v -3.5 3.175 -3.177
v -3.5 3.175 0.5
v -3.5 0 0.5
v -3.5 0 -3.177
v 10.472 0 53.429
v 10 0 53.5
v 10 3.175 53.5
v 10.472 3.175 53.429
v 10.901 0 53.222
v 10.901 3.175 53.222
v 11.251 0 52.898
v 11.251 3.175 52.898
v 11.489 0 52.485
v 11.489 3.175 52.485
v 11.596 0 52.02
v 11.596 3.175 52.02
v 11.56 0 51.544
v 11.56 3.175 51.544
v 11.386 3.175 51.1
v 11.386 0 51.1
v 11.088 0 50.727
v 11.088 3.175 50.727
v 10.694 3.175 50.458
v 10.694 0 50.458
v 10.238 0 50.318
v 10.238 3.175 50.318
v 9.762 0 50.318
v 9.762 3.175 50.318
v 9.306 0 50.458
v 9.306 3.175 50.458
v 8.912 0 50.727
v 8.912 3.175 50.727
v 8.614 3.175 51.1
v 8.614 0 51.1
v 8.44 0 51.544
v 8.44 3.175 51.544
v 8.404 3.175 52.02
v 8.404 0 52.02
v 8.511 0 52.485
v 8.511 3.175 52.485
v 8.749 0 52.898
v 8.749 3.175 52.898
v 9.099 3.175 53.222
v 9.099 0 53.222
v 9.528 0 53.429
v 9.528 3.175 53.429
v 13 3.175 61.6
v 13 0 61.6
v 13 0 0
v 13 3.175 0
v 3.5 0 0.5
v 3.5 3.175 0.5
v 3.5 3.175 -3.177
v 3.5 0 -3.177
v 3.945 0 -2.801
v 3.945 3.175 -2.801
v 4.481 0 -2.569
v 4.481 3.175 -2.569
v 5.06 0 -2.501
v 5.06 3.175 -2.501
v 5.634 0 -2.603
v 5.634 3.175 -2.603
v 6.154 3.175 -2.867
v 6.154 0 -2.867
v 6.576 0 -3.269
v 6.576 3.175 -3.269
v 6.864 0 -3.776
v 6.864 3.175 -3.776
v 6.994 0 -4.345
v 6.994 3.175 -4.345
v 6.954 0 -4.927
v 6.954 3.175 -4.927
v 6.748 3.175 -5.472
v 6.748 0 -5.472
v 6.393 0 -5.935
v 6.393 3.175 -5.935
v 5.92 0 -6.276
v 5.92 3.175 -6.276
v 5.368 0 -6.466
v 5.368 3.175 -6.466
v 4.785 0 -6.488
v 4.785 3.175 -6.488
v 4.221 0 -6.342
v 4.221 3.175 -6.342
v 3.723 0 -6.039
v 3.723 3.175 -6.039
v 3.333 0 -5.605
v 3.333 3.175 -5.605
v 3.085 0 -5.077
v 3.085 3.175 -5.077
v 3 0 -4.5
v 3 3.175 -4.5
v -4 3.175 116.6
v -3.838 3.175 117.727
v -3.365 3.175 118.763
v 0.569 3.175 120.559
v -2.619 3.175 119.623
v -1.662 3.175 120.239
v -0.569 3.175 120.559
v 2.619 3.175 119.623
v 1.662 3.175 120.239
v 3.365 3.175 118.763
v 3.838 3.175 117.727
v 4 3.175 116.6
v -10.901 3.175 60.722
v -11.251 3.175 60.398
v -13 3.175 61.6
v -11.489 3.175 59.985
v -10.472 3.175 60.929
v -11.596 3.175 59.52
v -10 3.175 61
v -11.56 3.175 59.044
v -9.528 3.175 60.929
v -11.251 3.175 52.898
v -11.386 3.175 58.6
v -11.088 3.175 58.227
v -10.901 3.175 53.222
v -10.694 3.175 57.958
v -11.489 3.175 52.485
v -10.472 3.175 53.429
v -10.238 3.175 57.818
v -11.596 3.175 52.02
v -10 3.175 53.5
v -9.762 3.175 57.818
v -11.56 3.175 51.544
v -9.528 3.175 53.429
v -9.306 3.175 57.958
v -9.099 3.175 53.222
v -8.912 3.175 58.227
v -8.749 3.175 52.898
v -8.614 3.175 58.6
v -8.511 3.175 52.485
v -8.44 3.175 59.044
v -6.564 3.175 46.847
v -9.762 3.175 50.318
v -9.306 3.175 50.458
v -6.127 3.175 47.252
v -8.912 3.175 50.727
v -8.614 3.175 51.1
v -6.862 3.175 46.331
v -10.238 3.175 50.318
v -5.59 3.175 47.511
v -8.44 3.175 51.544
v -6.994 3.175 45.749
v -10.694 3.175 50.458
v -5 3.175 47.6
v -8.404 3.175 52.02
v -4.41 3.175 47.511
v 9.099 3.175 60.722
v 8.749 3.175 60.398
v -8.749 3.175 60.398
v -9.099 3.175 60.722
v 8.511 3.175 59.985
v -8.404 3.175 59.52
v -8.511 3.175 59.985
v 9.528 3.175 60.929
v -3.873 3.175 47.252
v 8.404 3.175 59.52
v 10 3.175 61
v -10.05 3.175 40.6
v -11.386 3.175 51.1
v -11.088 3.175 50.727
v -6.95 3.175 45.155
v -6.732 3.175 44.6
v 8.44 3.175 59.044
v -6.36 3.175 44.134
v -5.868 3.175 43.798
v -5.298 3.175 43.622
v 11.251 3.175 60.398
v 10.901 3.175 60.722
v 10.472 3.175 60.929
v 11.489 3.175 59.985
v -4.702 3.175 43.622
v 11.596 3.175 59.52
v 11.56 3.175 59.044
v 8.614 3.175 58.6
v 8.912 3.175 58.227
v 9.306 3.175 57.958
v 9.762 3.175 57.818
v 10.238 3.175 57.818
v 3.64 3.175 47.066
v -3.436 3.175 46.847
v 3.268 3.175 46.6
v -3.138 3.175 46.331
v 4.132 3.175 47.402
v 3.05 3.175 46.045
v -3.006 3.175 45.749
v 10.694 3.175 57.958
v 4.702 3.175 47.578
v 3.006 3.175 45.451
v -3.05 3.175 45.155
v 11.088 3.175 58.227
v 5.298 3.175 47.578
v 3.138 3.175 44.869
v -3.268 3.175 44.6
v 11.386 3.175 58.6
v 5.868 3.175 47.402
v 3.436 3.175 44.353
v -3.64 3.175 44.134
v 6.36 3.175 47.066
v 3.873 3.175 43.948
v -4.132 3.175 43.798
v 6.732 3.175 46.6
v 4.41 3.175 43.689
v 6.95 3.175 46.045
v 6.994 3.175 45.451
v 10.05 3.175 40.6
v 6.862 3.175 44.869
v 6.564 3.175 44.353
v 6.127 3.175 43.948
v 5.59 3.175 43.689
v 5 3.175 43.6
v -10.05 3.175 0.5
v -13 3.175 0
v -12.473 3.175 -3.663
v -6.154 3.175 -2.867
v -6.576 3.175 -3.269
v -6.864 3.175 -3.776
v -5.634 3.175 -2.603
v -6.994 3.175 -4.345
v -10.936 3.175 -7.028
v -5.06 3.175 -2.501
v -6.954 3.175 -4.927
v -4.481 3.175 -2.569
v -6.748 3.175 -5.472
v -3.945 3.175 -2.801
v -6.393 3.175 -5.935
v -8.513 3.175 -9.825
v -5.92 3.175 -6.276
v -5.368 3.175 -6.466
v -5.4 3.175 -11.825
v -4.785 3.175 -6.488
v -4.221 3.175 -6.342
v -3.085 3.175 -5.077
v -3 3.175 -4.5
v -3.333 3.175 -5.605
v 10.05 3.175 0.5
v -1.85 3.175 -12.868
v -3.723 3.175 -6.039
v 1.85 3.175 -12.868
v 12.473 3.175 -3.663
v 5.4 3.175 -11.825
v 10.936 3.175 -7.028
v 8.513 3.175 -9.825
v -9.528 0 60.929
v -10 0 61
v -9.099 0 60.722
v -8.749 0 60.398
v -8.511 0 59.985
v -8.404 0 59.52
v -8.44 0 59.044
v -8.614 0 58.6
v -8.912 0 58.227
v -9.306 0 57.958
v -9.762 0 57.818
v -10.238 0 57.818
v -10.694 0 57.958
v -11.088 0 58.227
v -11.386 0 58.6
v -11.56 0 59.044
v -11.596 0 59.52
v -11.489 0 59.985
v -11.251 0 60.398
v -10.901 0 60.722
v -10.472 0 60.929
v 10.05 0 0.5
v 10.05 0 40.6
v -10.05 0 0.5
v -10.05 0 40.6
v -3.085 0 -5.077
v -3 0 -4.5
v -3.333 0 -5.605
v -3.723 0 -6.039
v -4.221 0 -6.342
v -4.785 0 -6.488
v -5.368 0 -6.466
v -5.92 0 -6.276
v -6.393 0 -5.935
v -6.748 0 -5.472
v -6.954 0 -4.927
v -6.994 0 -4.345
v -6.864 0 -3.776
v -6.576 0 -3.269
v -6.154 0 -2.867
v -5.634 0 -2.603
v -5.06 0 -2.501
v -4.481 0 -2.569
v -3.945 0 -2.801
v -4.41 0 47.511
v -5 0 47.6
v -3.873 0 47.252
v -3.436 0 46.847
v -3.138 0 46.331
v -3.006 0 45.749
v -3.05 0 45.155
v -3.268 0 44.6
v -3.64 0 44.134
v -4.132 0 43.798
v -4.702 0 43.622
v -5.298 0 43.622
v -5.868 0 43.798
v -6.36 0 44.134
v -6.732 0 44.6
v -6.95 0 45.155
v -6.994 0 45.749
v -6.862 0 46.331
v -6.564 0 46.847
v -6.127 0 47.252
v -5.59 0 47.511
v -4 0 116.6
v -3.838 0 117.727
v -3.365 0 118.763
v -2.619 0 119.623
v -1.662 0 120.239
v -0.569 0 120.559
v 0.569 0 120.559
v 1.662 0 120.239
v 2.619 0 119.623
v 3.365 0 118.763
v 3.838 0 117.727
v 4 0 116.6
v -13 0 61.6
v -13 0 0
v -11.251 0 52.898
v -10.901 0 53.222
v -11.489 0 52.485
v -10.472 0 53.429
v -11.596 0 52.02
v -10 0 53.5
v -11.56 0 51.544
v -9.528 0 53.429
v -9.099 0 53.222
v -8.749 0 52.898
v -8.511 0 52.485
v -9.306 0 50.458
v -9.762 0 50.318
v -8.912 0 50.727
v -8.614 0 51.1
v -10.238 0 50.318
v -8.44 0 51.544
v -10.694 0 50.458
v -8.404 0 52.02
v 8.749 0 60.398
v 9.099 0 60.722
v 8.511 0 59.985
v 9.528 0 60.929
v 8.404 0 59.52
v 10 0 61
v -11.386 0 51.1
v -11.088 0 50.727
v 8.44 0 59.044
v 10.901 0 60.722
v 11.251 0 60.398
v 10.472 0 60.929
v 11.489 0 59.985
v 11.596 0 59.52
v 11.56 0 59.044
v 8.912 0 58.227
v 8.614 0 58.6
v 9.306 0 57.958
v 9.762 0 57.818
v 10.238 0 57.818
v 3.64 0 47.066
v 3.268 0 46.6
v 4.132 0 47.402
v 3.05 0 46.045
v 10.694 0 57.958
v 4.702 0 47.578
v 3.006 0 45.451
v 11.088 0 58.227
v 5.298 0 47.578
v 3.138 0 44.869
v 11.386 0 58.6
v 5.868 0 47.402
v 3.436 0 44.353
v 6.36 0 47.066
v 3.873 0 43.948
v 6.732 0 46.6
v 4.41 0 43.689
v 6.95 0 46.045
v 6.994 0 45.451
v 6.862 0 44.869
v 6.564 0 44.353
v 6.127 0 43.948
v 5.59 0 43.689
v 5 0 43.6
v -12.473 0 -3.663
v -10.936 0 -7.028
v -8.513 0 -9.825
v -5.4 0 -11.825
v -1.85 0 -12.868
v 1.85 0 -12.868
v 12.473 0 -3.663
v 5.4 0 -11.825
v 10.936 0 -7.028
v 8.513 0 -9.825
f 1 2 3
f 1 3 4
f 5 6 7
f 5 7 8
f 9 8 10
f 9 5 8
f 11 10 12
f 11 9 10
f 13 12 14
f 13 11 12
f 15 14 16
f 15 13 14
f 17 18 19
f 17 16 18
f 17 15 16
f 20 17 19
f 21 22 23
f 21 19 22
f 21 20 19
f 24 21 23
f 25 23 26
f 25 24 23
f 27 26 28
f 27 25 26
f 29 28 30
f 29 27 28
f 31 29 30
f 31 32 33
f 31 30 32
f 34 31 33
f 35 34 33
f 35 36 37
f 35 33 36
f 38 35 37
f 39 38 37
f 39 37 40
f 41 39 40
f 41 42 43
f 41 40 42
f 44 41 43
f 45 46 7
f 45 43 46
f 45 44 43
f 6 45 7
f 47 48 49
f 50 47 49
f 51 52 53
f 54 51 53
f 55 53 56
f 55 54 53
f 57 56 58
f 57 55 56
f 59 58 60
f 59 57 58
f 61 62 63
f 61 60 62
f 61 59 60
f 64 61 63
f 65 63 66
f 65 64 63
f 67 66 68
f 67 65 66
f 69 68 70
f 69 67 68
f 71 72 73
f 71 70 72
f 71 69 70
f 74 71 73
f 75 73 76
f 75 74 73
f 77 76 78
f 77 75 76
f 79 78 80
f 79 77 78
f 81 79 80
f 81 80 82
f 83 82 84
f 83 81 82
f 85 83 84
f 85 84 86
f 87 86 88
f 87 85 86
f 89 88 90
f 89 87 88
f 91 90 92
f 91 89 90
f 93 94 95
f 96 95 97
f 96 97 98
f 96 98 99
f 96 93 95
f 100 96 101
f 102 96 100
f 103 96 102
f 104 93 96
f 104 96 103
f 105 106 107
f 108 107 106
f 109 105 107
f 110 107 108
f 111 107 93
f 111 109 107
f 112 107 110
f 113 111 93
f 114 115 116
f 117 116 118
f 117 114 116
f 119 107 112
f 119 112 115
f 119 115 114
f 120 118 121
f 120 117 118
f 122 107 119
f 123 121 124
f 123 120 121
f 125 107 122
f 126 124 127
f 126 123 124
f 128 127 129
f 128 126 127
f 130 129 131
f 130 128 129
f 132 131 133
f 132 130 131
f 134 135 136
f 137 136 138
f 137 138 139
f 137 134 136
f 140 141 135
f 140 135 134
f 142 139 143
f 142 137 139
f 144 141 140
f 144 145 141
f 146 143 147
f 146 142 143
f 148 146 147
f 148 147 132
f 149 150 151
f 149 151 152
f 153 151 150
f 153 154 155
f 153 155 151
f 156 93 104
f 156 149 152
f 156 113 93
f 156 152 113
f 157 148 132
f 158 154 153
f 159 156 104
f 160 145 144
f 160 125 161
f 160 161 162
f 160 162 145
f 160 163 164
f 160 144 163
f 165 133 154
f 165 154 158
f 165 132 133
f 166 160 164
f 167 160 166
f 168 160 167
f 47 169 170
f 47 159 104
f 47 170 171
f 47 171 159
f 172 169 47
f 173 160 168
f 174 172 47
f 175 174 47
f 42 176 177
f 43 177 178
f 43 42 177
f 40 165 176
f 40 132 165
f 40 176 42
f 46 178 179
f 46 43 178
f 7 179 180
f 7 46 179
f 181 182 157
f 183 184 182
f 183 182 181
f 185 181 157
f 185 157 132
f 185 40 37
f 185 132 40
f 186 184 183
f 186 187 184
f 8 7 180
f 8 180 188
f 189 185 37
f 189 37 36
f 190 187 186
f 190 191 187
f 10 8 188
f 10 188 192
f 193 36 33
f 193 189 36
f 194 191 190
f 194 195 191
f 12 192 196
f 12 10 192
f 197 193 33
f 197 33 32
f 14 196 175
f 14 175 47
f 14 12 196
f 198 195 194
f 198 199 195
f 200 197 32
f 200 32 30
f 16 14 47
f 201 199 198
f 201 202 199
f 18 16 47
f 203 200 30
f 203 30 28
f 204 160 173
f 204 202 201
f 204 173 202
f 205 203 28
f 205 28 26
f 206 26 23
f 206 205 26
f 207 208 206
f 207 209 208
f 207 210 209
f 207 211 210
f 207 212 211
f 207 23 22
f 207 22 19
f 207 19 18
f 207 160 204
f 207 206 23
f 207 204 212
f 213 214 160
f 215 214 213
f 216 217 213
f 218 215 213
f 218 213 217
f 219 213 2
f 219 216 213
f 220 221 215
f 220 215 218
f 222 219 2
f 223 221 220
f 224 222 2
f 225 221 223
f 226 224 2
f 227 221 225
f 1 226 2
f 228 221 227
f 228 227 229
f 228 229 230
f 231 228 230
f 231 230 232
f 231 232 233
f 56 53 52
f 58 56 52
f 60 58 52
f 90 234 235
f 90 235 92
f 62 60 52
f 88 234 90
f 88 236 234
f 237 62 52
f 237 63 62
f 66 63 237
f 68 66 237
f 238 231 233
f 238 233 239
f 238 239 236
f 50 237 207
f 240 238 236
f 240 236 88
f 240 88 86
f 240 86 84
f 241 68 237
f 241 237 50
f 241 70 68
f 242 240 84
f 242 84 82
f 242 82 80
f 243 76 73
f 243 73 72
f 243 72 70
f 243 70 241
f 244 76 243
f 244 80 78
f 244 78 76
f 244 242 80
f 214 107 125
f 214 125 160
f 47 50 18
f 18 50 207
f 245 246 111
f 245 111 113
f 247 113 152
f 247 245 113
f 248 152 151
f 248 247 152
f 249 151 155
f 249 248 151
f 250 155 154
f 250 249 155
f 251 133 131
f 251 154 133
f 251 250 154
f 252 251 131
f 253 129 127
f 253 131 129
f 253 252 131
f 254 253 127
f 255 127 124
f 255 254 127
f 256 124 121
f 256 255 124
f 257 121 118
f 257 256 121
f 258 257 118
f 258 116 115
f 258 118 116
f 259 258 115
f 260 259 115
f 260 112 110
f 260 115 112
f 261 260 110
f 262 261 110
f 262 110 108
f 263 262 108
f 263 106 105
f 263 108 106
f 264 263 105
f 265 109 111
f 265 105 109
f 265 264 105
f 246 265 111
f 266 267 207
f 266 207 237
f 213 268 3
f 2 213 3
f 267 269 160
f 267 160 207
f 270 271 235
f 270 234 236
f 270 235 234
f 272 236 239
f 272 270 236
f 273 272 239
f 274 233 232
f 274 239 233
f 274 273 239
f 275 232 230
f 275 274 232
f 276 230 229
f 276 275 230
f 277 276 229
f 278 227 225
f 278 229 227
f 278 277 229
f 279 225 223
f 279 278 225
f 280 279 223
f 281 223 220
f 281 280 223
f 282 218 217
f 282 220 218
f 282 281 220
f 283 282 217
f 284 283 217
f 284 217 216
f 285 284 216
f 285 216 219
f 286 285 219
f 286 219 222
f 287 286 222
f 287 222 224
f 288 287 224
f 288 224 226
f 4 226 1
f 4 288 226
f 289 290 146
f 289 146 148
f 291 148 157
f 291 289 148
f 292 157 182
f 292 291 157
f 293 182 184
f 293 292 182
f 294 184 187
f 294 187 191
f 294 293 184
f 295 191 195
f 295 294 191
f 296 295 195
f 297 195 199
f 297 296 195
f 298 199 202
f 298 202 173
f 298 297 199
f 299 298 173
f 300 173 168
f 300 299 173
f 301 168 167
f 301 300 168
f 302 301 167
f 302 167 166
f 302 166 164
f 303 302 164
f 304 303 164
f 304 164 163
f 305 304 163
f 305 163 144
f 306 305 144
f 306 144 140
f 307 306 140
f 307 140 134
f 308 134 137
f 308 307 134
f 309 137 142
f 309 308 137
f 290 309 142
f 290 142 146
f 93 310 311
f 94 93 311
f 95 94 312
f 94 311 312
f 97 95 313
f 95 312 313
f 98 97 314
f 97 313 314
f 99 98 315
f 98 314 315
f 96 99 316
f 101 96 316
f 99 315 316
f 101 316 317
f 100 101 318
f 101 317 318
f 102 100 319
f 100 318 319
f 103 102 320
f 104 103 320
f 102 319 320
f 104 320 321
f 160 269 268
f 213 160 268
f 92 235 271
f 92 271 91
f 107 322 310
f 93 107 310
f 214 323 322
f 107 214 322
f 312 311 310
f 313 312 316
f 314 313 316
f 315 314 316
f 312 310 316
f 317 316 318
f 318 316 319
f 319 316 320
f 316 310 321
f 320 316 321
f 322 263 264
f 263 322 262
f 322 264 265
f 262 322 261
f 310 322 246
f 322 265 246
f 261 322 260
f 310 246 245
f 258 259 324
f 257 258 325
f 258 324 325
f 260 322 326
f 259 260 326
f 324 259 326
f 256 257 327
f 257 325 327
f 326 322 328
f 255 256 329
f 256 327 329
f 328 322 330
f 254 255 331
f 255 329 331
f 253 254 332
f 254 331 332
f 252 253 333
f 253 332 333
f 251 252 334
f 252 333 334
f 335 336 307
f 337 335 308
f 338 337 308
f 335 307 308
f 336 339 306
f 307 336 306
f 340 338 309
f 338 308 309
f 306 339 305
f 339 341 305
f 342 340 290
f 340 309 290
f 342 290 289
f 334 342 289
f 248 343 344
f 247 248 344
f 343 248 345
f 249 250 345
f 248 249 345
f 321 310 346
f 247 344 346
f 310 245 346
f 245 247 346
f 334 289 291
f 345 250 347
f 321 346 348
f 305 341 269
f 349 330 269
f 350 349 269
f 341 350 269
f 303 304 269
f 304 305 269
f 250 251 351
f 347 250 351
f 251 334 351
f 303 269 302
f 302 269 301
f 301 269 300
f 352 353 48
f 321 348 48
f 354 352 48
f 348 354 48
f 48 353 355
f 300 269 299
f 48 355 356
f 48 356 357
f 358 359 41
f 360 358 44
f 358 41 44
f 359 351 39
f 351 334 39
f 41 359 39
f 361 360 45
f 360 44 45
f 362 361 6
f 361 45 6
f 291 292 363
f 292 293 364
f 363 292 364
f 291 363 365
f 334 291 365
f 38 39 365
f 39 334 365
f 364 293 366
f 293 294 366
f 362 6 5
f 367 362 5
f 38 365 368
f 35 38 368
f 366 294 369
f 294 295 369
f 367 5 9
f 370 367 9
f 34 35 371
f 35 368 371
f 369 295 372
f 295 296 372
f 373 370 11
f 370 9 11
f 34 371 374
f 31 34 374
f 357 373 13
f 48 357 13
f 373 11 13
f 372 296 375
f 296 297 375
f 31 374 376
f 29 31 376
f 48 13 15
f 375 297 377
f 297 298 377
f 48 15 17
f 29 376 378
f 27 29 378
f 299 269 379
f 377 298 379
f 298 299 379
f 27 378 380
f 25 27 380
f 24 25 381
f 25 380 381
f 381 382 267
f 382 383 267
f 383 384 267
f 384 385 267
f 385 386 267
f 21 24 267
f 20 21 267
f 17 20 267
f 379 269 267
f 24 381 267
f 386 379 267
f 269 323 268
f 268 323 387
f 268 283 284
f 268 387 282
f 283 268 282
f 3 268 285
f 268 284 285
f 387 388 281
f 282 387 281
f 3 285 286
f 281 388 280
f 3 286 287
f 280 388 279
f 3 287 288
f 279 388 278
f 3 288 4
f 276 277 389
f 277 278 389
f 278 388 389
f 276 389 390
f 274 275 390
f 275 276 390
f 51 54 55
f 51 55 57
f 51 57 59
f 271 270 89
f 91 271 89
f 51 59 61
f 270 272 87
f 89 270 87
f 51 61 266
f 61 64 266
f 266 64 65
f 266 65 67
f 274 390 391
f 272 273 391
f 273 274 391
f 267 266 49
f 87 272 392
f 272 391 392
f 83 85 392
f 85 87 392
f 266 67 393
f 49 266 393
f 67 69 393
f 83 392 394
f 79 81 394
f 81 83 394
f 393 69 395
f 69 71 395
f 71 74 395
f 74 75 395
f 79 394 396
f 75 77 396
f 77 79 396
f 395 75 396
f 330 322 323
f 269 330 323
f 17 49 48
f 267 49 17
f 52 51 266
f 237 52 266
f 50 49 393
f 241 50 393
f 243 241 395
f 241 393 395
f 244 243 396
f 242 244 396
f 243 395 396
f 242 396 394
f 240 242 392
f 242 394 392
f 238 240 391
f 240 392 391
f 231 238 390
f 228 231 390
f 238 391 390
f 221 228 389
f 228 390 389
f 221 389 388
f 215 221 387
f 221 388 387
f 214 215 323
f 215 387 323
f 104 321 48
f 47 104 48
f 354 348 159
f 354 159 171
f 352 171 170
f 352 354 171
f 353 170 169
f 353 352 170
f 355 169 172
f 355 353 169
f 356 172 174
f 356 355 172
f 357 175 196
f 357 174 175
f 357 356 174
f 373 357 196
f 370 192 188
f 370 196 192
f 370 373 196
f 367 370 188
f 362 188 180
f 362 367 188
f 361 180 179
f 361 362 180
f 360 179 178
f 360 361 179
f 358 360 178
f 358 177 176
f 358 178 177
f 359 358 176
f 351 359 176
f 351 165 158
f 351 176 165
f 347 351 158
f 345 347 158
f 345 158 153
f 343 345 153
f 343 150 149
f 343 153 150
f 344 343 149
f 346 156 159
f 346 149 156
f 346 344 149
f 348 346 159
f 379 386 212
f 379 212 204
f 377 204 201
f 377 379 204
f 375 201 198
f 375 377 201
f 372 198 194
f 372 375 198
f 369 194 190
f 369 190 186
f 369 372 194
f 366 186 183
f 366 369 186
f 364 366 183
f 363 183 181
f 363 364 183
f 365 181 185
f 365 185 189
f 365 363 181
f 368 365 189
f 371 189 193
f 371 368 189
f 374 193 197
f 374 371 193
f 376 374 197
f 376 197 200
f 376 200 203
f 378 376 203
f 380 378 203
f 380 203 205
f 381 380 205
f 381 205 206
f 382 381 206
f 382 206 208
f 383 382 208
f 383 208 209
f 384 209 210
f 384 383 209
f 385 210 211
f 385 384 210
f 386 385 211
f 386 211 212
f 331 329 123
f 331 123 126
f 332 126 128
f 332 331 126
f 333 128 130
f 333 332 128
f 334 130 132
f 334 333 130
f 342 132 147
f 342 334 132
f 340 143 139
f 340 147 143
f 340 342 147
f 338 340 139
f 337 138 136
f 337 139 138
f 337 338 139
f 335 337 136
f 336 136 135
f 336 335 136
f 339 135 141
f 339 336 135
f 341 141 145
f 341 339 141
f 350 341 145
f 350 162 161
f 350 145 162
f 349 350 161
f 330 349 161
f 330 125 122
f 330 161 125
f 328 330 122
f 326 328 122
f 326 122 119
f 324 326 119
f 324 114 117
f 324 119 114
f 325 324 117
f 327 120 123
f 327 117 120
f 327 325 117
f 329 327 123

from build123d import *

# Parameters (mm, degrees)
SKETCH2_R               = 2
SKETCH2_W               = 20.1
SKETCH2_H               = 40.1
BOSS_EXTRUDE1_DEPTH     = 3.175
CUT_EXTRUDE1_DEPTH      = 122.340185532
CUT_EXTRUDE1_DEPTH_BACK = 122.340185532
SKETCH3_R               = 1.6
SKETCH4_W               = 7
SKETCH4_H               = 5
CUT_EXTRUDE2_DEPTH      = 3.175


with BuildPart() as part:
    # Sketch2 → Boss-Extrude1 (new body)
    with BuildSketch(Plane(origin=(0, 0, 0), x_dir=(1, 0, 0), z_dir=(0, 1, 0))):
        with BuildLine():
            Line((-13, 0), (-13, -61.6))
            Line((-13, -61.6), (-4, -116.6))
            ThreePointArc((-4, -116.6), (0, -120.6), (4, -116.6))
            Line((4, -116.6), (13, -61.6))
            Line((13, -61.6), (13, 0))
            ThreePointArc((13, 0), (0, 13), (-13, 0))
        make_face()
        with Locations(Location((-5, 4.5, 0), (0, 0, 270))):
            Circle(SKETCH2_R, mode=Mode.SUBTRACT)
        with Locations(Location((-5, -45.6, 0), (0, 0, 270))):
            Circle(SKETCH2_R, mode=Mode.SUBTRACT)
        with Locations(Location((5, -45.6, 0), (0, 0, 90))):
            Circle(SKETCH2_R, mode=Mode.SUBTRACT)
        with Locations(Location((5, 4.5, 0), (0, 0, 90))):
            Circle(SKETCH2_R, mode=Mode.SUBTRACT)
        with Locations((0, -20.55)):
            Rectangle(SKETCH2_W, SKETCH2_H, mode=Mode.SUBTRACT)
    extrude(amount=BOSS_EXTRUDE1_DEPTH)

    # Sketch3 → Cut-Extrude1 (cut, two sides: drawn at the far end of the back side and taken through both)
    with BuildSketch(Plane(origin=(0, 3.175, 0), x_dir=(1, 0, 0), z_dir=(0, 1, 0)).offset(-CUT_EXTRUDE1_DEPTH_BACK)):
        with Locations(Location((10, -59.4, 0), (0, 0, 270))):
            Circle(SKETCH3_R)
        with Locations(Location((10, -51.9, 0), (0, 0, 270))):
            Circle(SKETCH3_R)
        with Locations(Location((-10, -59.4, 0), (0, 0, 270))):
            Circle(SKETCH3_R)
        with Locations(Location((-10, -51.9, 0), (0, 0, 270))):
            Circle(SKETCH3_R)
    extrude(amount=CUT_EXTRUDE1_DEPTH + CUT_EXTRUDE1_DEPTH_BACK, mode=Mode.SUBTRACT)

    # Sketch4 → Cut-Extrude2 (cut)
    with BuildSketch(Plane(origin=(0, 3.175, 0), x_dir=(1, 0, 0), z_dir=(0, 1, 0))):
        with Locations((0, 2)):
            Rectangle(SKETCH4_W, SKETCH4_H)
    extrude(amount=-CUT_EXTRUDE2_DEPTH, mode=Mode.SUBTRACT)


solid = part.part
